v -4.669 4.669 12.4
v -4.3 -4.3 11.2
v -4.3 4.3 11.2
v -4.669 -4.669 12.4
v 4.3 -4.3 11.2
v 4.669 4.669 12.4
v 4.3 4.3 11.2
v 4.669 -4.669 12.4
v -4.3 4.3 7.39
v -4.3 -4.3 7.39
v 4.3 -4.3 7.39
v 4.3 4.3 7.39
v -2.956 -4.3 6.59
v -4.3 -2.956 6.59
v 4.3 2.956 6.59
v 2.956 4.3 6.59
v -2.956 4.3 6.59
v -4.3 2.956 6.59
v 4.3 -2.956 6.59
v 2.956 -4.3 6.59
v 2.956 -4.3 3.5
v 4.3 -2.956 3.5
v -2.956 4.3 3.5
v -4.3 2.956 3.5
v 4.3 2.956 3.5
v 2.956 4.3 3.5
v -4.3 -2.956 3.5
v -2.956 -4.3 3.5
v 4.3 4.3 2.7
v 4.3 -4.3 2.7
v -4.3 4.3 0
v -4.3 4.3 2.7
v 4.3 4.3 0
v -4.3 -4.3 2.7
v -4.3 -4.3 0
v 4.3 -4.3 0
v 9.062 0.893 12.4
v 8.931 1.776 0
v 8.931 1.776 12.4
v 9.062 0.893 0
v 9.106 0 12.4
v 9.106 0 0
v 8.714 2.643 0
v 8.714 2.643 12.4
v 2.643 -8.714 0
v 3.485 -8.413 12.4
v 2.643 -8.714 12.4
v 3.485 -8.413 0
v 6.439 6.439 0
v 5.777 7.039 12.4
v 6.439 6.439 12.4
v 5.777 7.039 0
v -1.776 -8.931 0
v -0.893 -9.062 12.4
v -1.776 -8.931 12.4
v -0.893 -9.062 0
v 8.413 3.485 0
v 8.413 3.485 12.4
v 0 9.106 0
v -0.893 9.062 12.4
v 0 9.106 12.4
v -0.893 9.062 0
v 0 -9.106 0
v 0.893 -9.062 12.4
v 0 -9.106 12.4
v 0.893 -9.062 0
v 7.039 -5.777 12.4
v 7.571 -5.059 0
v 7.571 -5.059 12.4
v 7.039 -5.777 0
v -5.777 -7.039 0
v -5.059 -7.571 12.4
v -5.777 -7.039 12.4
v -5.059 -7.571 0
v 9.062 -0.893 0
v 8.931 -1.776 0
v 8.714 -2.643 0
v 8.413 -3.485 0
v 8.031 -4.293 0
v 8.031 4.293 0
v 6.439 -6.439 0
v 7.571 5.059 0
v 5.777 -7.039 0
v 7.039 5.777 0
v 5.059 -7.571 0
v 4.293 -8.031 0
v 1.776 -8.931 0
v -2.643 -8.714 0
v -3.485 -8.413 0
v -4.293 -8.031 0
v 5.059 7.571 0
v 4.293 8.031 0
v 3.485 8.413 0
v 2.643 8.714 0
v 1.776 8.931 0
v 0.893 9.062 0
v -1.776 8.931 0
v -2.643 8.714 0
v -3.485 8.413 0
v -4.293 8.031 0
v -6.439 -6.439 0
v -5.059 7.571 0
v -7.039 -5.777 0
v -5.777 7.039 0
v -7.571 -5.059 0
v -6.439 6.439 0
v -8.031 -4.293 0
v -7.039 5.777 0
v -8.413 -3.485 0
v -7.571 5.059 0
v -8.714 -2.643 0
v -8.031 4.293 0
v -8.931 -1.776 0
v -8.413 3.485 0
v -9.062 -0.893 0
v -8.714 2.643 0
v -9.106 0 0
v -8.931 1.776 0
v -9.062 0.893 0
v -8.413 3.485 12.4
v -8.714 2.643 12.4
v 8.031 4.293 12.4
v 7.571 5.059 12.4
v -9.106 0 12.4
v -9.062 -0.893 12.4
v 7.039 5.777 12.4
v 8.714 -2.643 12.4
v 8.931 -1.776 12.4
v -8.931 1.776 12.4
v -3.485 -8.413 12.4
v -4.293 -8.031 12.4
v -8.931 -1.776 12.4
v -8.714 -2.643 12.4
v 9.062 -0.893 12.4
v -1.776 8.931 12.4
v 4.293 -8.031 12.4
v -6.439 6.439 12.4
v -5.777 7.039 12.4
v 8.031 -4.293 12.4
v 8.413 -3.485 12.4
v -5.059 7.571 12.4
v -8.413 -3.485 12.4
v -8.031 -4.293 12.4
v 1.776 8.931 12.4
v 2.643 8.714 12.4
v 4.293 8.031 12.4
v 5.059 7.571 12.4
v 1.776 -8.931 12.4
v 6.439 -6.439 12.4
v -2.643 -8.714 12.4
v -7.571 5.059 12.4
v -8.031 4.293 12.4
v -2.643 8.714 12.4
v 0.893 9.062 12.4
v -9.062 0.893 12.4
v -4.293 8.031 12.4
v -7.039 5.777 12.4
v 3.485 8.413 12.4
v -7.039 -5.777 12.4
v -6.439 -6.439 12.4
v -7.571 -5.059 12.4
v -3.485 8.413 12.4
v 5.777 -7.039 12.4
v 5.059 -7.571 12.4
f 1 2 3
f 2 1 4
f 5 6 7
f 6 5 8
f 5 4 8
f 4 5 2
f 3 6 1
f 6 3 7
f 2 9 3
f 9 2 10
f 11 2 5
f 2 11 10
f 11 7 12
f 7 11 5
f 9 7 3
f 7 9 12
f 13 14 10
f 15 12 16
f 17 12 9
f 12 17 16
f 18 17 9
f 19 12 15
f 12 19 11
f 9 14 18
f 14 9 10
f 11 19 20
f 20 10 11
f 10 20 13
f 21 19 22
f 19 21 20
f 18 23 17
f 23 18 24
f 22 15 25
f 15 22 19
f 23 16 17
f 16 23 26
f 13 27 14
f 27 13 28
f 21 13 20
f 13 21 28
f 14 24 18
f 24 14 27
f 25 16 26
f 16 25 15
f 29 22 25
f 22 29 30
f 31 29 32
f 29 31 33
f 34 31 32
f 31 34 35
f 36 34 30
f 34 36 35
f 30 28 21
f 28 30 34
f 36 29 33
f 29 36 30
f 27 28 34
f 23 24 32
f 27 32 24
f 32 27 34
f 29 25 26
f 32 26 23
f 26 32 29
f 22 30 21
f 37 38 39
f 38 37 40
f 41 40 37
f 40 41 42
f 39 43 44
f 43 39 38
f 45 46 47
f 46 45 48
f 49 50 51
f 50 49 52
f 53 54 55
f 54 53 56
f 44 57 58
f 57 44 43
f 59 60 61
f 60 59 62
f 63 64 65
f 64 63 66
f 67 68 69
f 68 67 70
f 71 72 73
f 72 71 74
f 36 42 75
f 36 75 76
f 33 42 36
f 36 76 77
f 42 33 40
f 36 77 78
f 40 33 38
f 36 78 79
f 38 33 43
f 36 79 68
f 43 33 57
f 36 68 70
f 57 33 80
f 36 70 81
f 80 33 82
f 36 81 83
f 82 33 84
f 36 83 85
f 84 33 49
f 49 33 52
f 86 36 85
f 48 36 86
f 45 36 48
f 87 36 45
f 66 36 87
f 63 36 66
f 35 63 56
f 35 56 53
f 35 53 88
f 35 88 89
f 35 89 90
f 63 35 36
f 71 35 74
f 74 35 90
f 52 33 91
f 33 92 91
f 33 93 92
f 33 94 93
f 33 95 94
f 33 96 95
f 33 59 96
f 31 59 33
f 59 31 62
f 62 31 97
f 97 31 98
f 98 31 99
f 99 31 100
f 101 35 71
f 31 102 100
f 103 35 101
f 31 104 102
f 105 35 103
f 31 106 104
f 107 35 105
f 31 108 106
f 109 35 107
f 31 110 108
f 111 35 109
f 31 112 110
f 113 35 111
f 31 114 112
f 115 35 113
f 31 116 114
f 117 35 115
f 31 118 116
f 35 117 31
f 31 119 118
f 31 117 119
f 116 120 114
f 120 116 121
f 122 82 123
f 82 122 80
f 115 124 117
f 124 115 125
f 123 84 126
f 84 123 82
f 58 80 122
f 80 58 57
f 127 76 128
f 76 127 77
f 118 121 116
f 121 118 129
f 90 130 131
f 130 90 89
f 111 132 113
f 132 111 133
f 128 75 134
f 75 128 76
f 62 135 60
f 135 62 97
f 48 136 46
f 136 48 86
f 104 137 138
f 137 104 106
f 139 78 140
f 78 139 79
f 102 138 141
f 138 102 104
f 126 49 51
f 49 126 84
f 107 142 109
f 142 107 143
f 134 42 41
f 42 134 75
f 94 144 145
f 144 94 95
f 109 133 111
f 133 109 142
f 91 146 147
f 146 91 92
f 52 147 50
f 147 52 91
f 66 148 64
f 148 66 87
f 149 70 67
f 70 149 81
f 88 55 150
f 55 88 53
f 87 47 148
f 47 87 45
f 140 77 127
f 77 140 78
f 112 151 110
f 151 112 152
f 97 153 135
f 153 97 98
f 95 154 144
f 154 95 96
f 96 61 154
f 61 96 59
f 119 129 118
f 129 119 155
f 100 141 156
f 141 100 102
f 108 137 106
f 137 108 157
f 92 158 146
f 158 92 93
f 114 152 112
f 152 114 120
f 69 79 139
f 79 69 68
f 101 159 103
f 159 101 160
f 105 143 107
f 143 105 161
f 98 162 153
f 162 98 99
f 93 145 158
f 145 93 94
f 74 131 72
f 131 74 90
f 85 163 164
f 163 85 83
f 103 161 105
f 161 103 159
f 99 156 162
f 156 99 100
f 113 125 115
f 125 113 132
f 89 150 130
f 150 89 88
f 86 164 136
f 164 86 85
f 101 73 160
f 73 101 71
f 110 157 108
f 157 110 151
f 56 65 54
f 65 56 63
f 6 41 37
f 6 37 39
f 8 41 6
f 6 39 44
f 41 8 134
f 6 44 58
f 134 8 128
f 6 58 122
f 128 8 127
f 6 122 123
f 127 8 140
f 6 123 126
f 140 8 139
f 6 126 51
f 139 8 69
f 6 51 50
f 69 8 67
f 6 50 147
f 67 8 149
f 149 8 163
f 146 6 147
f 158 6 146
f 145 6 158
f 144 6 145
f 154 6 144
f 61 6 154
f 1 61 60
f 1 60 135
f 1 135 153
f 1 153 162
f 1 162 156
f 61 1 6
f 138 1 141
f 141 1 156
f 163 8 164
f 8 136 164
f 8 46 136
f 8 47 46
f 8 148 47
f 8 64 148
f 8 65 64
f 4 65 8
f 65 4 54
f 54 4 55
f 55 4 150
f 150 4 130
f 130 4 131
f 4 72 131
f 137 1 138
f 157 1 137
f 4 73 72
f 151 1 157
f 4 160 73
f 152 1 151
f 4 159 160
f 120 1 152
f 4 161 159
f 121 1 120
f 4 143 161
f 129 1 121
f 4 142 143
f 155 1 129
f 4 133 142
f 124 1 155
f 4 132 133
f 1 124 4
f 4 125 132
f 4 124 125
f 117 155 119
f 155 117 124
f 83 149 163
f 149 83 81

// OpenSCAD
// file: _connection.scad
// =====================================
// Fisher-Price Power Workshop - Shared Connection
// Common square-peg connection shared by all attachments
// See CONNECTION_SPEC.md for measurement details
// =====================================

// ---- Connection Parameters (mm) ----

// Square shaft (male end - plugs into handle)
// Measured from calipers on existing attachment
shaft_sq = 8.2;          // side length
shaft_sq_length = 12.4;  // total length of square shaft (3.5 + 3.1 + 5.8)

// Snap groove in the square shaft
groove_pos = 3.5 + 3.1/2;   // from tip (z=0) to groove center
groove_width = 3.1;      // width of the groove
groove_depth = 0.95;     // per side: (8.2 - 6.3) / 2
groove_bevel = 0.8;      // taper height at each end of groove
tip_bevel = 0.8;         // taper height at tip for insertion guide
corner_r = 1.0;          // corner rounding radius on male shaft (mimics injection-molded originals)

// Transition collar
collar_diameter = 12.5;  // measured
collar_length = 8.3;     // measured
collar_bevel = 2.0;      // taper from square shaft to round collar

// Square socket (female end - accepts male shaft)
// Sized to accept shaft with clearance
socket_size = 8.6;      // side length (+0.4mm clearance over 8.2mm shaft)
socket_depth = 13;      // depth of square socket (accepts 12.4mm shaft)
socket_lead_in = 1.2;   // chamfer depth at the opening to reduce catching

// Snap ridge inside socket (mates with groove on attachments)
ridge_pos = 7.35;       // from opening; aligns with groove when shaft inserted
ridge_width = 3.1;      // matches groove width
ridge_depth = 0.95;     // matches groove depth
ridge_bevel = 0.8;      // taper height at each end of ridge (matches groove_bevel)

// ---- Connection Modules ----

// 2D profile for corner-only snap ridge.
// Intersecting the socket square with a 45-degree-rotated square creates an
// octagon — material protrudes only at the four corners, allowing the shaft
// to push past with moderate force while still snapping into the groove for
// retention.
module _ridge_profile() {
    intersection() {
        square(socket_size, center=true);
        rotate([0, 0, 45])
            square(socket_size * sqrt(2) - ridge_depth * 2, center=true);
    }
}

// 2D rounded-square profile for male shaft cross-sections.
// Shrinks inward then rounds back outward so the result is the same side
// length with corners rounded at corner_r radius.
module _shaft_profile(size) {
    offset(r = corner_r) offset(delta = -corner_r)
        square(size, center = true);
}

// Square plug shaft with snap groove and beveled transitions
module sq_shaft() {
    groove_start = groove_pos - groove_width/2;
    groove_end = groove_pos + groove_width/2;
    groove_sq = shaft_sq - groove_depth * 2;

    // Tip bevel (matches groove transition style)
    hull() {
        linear_extrude(0.01)
            _shaft_profile(groove_sq);
        translate([0, 0, tip_bevel])
            linear_extrude(0.01)
                _shaft_profile(shaft_sq);
    }

    // Remaining tip section
    translate([0, 0, tip_bevel])
        linear_extrude(groove_start - groove_bevel - tip_bevel)
            _shaft_profile(shaft_sq);

    // Bevel into groove
    hull() {
        translate([0, 0, groove_start - groove_bevel])
            linear_extrude(0.01)
                _shaft_profile(shaft_sq);
        translate([0, 0, groove_start])
            linear_extrude(0.01)
                _shaft_profile(groove_sq);
    }

    // Groove
    translate([0, 0, groove_start])
        linear_extrude(groove_width)
            _shaft_profile(groove_sq);

    // Bevel out of groove
    hull() {
        translate([0, 0, groove_end])
            linear_extrude(0.01)
                _shaft_profile(groove_sq);
        translate([0, 0, groove_end + groove_bevel])
            linear_extrude(0.01)
                _shaft_profile(shaft_sq);
    }

    // Main shaft
    translate([0, 0, groove_end + groove_bevel])
        linear_extrude(shaft_sq_length - groove_end - groove_bevel)
            _shaft_profile(shaft_sq);
}

// Square socket with snap ridge and beveled transitions
// Includes a chamfered lead-in at the opening to reduce insertion catching
module square_socket() {
    ridge_start = ridge_pos - ridge_width/2;
    ridge_end = ridge_pos + ridge_width/2;

    // Lead-in chamfer at opening — wider at the entrance, tapers to socket_size at depth
    translate([0, 0, -0.1])
        linear_extrude(socket_lead_in + 0.1, scale = socket_size / (socket_size + 0.8))
            square(socket_size + 0.8, center = true);

    // Below ridge (full-size socket)
    translate([0, 0, socket_lead_in])
        linear_extrude(ridge_start - ridge_bevel - socket_lead_in)
            square(socket_size, center = true);

    // Bevel into ridge
    hull() {
        translate([0, 0, ridge_start - ridge_bevel])
            linear_extrude(0.01)
                square(socket_size, center = true);
        translate([0, 0, ridge_start])
            linear_extrude(0.01)
                _ridge_profile();
    }

    // Ridge section (corner-only octagonal profile)
    translate([0, 0, ridge_start])
        linear_extrude(ridge_width)
            _ridge_profile();

    // Bevel out of ridge
    hull() {
        translate([0, 0, ridge_end])
            linear_extrude(0.01)
                _ridge_profile();
        translate([0, 0, ridge_end + ridge_bevel])
            linear_extrude(0.01)
                square(socket_size, center = true);
    }

    // Above ridge to full depth
    translate([0, 0, ridge_end + ridge_bevel])
        linear_extrude(socket_depth - ridge_end - ridge_bevel + 0.1)
            square(socket_size, center = true);
}

// Transition collar with beveled square-to-round base
module collar() {
    translate([0, 0, shaft_sq_length - 0.01]) {  // -0.01mm overlap with shaft top prevents coplanar faces
        // Taper from square shaft to round collar
        hull() {
            linear_extrude(0.01)
                _shaft_profile(shaft_sq);
            translate([0, 0, collar_bevel])
                cylinder(d = collar_diameter, h = 0.01);
        }
        // Remaining collar
        translate([0, 0, collar_bevel])
            cylinder(d = collar_diameter, h = collar_length - collar_bevel);
    }
}
// main file
// =====================================
// Test print - Female connection (socket in a short cylinder)
// Quick print to verify fit against male shaft
// =====================================

include <_connection.scad>

$fn = 64;

// Minimal surrounding wall
wall = 3;
body_diameter = socket_size * 1.42 + wall * 2;  // enough to enclose the square socket
// Height equals shaft length so the collar face sits flush on the top when assembled.
// This also ensures both STLs are in their assembled position at z=0 for interference
// checking: shaft tip (z=0) aligns with socket floor, collar (z=shaft_sq_length) rests
// on the top face of this body.
body_height = shaft_sq_length;

// ---- Assembly: short cylinder with socket opening at the top ----
difference() {
    cylinder(d = body_diameter, h = body_height);

    // Socket opens at the top (z=body_height).  Rotate 180° so the square_socket
    // module's opening (local z=0) faces upward, then translate to the top face.
    translate([0, 0, body_height])
        rotate([180, 0, 0])
            square_socket();
}
